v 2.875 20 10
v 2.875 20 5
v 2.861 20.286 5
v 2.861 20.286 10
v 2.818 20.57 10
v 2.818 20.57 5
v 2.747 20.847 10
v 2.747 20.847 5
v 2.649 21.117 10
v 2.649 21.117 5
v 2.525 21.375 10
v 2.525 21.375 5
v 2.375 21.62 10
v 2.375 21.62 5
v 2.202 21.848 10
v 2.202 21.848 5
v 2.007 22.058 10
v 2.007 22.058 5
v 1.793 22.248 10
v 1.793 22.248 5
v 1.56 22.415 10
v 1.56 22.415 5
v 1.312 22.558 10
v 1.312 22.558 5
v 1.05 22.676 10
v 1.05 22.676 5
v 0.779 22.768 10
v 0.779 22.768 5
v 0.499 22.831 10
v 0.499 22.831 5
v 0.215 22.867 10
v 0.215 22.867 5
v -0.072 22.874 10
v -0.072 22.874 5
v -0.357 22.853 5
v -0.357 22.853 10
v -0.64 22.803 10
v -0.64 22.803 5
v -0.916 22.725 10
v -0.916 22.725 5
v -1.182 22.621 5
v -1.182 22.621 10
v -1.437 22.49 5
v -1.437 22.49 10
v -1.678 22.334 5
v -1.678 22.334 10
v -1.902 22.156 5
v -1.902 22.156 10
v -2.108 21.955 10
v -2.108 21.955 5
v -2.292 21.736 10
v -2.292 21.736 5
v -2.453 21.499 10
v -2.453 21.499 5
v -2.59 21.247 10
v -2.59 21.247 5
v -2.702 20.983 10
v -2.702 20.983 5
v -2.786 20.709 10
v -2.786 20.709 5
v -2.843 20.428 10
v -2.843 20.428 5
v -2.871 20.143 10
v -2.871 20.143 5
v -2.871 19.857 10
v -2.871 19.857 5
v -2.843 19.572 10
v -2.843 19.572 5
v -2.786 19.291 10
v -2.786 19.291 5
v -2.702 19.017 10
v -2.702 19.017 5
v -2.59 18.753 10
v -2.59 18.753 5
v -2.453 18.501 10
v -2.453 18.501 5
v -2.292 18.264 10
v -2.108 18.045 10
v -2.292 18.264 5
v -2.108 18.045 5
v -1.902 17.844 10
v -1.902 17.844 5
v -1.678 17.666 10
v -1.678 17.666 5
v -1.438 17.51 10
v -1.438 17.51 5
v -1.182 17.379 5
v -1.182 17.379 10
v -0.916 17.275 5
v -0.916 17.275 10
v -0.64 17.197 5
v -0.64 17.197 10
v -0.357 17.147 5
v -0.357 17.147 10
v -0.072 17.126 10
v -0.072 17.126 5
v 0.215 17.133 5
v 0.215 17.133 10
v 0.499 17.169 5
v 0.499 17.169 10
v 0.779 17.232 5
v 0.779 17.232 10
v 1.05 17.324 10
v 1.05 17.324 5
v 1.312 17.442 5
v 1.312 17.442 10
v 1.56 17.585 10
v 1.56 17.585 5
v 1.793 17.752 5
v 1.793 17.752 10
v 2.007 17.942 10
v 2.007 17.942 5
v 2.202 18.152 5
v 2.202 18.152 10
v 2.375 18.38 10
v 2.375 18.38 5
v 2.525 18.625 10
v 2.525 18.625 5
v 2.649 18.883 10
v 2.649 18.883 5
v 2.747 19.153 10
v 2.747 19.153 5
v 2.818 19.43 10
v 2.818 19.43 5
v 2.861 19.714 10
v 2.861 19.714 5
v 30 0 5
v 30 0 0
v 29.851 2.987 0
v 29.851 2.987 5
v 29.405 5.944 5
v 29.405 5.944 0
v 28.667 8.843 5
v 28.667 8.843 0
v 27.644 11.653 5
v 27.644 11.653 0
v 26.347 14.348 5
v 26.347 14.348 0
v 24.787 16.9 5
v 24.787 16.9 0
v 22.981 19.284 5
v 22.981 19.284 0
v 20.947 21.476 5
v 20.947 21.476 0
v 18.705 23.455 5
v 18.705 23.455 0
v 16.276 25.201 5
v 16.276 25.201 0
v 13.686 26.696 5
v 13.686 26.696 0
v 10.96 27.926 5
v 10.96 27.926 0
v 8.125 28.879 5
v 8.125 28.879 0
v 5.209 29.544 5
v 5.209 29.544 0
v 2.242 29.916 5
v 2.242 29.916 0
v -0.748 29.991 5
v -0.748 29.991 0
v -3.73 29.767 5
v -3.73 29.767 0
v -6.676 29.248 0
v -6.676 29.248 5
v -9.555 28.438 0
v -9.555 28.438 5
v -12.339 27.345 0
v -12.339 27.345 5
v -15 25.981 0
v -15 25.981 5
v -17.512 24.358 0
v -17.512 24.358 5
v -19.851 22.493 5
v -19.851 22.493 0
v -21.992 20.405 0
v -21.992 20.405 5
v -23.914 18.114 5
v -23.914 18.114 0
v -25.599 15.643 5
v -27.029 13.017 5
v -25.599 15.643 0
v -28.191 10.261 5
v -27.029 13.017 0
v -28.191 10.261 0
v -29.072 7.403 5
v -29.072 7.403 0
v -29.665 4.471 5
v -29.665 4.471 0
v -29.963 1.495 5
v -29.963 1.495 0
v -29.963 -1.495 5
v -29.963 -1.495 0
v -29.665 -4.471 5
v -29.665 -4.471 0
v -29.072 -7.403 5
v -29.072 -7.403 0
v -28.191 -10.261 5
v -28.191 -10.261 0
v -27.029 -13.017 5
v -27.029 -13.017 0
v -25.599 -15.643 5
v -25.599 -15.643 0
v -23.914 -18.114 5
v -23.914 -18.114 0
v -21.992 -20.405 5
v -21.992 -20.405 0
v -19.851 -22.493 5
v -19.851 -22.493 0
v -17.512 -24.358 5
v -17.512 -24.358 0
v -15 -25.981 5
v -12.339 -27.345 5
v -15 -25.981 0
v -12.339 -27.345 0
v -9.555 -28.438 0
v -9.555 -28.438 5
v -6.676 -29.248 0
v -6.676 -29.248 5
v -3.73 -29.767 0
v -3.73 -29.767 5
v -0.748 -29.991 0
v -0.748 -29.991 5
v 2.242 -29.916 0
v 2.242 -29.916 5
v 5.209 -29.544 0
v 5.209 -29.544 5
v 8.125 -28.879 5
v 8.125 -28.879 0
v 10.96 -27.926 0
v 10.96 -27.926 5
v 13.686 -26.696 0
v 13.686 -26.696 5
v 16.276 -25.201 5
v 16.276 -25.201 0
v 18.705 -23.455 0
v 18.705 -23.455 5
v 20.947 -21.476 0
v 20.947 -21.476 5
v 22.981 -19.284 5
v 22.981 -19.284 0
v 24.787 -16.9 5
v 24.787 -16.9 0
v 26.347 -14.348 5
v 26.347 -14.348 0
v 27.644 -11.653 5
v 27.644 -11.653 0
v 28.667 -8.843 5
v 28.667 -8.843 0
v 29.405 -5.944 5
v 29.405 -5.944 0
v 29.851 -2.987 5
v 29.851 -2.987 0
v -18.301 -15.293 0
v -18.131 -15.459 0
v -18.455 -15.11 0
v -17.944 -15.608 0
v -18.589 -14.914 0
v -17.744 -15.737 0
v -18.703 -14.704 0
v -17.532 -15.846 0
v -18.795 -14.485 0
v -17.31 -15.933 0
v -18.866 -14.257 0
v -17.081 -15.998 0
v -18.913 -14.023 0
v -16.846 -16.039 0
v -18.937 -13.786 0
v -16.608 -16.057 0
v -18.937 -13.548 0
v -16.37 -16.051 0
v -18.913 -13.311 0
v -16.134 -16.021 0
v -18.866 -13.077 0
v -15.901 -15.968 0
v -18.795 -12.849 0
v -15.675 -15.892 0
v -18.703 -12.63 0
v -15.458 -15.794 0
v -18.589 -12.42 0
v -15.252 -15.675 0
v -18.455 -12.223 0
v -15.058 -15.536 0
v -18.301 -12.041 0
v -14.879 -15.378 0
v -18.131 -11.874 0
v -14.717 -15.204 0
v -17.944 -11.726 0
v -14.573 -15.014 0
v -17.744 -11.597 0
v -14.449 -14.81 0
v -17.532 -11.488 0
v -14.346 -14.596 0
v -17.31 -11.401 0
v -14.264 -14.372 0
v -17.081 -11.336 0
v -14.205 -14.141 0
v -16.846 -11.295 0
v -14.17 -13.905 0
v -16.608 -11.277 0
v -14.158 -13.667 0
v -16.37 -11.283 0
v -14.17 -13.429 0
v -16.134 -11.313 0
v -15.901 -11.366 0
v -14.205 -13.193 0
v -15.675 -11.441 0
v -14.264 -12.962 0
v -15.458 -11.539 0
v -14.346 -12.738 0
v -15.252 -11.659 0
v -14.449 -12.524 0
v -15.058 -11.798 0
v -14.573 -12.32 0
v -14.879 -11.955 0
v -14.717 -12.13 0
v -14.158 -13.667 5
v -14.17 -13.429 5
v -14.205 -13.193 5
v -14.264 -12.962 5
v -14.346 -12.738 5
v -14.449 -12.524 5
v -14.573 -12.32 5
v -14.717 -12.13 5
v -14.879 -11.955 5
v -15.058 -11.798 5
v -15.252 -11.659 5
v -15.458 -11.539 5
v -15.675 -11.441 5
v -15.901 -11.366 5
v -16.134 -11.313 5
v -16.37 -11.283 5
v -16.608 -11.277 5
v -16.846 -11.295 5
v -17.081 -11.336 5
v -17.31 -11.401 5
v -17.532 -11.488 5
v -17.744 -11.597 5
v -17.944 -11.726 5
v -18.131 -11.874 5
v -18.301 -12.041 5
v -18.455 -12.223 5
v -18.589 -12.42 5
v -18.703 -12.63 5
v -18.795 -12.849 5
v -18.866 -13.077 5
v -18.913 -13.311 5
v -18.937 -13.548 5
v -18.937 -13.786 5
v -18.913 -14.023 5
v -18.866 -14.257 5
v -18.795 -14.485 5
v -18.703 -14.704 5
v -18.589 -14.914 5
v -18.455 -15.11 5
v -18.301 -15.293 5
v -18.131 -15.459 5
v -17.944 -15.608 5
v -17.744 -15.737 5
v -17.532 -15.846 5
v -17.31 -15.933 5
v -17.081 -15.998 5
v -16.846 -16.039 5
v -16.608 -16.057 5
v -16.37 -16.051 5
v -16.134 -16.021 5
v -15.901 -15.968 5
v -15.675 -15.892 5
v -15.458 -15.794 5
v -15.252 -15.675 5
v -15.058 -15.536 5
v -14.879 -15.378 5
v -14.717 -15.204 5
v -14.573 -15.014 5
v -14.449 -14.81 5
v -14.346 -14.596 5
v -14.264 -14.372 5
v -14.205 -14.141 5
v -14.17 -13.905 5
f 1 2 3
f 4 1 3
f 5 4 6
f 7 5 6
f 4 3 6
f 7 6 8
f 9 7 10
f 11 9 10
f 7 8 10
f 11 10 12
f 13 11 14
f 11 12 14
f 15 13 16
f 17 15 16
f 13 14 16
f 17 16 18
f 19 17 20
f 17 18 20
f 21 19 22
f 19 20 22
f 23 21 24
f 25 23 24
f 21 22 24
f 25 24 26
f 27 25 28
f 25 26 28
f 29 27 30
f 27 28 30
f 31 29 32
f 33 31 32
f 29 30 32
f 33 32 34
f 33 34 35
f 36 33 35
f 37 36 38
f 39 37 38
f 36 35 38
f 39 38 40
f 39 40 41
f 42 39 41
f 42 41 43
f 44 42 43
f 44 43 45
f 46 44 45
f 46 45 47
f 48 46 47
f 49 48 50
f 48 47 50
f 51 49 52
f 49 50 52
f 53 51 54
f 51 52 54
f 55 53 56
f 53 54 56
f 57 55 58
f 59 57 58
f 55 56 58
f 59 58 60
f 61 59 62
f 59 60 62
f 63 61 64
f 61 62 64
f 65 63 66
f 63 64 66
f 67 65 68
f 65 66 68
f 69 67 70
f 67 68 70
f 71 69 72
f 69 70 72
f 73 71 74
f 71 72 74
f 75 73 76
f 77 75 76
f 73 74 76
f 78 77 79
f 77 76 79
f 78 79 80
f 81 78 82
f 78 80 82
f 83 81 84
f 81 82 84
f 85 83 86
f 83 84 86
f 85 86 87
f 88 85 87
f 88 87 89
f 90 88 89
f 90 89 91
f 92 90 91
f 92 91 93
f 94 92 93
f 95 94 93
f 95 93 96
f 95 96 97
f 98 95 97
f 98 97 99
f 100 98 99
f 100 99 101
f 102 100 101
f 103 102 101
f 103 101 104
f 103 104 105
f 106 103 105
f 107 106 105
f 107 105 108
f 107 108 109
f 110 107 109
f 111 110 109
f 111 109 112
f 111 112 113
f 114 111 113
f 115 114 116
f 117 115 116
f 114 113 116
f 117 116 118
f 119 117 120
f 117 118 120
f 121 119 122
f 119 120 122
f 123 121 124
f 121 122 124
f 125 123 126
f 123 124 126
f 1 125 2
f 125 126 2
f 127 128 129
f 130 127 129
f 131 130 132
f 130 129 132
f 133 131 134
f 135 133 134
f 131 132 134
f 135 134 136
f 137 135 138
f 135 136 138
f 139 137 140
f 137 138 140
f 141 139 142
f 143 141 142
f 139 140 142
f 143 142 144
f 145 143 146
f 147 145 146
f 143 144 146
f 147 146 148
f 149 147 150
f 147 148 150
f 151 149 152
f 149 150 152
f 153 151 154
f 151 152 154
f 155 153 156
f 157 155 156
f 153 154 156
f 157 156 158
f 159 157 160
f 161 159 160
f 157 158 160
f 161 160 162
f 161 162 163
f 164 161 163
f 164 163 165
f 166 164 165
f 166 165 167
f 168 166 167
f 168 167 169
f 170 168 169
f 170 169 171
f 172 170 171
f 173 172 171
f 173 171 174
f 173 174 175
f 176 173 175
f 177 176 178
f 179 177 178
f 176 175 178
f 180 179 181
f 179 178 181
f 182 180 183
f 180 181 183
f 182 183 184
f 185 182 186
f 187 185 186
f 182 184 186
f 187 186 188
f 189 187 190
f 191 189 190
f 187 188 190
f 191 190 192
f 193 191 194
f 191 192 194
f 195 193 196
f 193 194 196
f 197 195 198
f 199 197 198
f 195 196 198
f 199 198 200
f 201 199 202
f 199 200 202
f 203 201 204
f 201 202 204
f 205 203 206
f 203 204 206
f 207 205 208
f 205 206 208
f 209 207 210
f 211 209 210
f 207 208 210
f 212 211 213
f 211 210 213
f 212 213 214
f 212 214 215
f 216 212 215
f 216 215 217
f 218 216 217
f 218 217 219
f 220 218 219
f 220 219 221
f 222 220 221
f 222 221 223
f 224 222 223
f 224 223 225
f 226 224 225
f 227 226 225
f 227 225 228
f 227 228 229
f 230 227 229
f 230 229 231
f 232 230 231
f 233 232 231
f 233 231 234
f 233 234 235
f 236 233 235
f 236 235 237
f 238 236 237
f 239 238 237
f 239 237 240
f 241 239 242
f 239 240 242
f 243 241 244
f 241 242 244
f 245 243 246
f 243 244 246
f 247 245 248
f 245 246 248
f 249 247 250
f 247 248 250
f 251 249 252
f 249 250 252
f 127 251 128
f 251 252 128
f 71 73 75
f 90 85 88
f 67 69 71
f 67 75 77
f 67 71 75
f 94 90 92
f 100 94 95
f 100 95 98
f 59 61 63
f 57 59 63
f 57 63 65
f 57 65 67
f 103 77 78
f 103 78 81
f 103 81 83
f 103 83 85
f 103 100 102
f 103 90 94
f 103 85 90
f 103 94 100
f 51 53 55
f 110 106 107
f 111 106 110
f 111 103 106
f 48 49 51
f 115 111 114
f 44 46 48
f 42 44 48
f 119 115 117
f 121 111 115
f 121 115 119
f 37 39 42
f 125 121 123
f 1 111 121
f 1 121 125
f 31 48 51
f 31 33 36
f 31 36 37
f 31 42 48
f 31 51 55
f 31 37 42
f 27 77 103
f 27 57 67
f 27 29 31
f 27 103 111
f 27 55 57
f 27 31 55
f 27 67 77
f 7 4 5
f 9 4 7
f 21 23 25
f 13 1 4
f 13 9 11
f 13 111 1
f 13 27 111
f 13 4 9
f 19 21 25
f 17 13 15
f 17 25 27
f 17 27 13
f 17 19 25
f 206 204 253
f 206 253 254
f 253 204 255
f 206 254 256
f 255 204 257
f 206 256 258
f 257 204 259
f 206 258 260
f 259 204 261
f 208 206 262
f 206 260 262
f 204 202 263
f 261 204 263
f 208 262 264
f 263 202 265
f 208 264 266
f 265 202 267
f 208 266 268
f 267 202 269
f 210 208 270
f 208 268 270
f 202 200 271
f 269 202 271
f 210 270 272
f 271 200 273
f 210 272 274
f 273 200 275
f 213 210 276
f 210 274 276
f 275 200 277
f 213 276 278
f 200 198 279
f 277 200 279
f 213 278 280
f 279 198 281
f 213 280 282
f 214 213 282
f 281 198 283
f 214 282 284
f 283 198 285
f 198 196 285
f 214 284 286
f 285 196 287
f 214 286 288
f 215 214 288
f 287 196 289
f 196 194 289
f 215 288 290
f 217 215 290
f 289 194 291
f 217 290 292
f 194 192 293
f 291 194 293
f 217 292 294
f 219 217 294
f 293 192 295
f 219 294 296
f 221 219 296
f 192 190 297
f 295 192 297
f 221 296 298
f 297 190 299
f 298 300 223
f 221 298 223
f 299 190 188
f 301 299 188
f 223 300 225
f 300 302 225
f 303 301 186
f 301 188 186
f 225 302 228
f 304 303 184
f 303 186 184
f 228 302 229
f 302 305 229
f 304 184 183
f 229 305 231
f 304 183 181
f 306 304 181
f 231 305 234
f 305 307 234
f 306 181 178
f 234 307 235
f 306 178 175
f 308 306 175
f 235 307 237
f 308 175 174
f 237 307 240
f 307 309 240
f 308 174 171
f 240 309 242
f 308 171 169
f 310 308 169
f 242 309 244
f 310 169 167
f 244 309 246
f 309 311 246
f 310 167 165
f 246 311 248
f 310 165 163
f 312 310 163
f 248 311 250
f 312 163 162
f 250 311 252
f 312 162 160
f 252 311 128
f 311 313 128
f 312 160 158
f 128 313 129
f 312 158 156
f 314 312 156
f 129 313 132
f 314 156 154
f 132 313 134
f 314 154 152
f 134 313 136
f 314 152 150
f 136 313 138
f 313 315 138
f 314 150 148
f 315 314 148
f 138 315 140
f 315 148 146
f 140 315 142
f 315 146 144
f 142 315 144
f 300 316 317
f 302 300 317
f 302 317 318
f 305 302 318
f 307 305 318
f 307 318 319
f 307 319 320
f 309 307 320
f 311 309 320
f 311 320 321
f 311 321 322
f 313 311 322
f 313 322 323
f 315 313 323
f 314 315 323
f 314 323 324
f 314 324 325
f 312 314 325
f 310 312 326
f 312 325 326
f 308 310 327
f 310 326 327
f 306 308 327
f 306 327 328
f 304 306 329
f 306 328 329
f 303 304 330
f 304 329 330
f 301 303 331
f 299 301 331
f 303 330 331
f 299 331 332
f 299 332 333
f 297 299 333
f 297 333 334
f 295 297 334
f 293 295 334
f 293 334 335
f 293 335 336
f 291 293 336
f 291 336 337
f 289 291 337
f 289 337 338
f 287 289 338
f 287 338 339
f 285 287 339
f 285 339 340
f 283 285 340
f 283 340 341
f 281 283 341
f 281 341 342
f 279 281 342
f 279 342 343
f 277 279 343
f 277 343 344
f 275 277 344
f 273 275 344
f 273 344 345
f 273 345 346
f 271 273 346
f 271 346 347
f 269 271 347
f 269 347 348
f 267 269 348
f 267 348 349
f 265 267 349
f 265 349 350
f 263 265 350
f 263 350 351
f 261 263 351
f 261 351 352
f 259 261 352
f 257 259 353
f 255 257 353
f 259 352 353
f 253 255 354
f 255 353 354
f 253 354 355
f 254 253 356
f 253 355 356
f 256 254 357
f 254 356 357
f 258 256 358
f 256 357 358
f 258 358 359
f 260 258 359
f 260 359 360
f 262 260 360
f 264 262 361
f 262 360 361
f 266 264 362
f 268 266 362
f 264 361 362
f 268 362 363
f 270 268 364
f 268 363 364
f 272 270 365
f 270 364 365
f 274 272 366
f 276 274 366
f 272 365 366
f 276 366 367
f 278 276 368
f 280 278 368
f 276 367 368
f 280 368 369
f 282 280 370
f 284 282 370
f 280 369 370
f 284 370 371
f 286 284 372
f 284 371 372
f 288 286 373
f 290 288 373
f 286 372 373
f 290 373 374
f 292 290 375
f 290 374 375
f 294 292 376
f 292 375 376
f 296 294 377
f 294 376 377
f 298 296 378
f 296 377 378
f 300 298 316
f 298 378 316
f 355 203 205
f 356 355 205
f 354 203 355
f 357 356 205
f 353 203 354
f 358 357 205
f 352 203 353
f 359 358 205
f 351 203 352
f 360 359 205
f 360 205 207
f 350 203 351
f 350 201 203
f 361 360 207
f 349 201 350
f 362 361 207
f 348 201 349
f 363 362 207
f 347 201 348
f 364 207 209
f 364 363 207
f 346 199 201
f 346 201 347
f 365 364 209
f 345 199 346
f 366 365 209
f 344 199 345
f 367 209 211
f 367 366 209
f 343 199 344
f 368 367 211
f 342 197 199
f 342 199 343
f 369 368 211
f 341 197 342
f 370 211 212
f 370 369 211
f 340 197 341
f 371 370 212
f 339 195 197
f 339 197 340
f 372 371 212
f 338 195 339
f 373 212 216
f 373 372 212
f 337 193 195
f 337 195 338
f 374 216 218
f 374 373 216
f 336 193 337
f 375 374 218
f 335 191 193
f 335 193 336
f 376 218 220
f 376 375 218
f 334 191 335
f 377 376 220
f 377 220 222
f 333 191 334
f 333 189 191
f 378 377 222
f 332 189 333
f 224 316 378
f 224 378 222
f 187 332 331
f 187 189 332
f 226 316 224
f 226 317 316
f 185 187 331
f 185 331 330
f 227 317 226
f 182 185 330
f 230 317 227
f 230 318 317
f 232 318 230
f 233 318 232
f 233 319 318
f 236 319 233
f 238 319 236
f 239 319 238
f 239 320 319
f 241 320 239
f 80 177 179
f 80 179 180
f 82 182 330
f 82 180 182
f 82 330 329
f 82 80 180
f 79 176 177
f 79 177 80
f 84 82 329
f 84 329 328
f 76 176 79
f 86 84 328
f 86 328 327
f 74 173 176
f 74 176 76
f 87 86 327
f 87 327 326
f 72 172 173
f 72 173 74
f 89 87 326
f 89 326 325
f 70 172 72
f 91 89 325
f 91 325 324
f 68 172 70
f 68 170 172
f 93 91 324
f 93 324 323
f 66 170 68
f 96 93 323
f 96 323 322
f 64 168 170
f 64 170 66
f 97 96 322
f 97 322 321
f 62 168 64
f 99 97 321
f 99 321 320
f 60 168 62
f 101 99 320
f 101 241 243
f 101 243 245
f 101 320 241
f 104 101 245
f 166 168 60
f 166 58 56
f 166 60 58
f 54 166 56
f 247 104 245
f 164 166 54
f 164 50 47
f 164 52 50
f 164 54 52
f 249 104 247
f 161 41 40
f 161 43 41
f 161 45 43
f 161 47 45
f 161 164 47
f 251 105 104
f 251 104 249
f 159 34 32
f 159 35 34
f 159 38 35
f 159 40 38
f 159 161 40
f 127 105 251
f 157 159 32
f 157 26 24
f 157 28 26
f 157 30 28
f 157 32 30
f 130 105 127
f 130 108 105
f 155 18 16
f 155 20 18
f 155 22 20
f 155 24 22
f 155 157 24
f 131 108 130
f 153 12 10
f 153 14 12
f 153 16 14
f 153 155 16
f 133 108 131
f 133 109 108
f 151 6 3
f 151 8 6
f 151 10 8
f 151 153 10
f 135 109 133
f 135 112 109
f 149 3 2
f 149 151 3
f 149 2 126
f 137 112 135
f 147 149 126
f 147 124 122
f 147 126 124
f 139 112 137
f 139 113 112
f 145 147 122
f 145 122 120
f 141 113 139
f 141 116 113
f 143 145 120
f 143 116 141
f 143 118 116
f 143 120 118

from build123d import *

# Parameters (mm, degrees)
SKETCH1_R           = 30
BOSS_EXTRUDE1_DEPTH = 5
SKETCH2_R           = 2.875
BOSS_EXTRUDE2_DEPTH = 5
SKETCH3_R           = 2.390739662
CUT_EXTRUDE1_DEPTH  = 10


with BuildPart() as part:
    # Sketch1 → Boss-Extrude1 (new body)
    with BuildSketch(Plane.XY):
        Circle(SKETCH1_R)
    extrude(amount=BOSS_EXTRUDE1_DEPTH)

    # Sketch2 → Boss-Extrude2 (add)
    with BuildSketch(Plane.XY.offset(5)):
        with Locations((0, 20)):
            Circle(SKETCH2_R)
    extrude(amount=BOSS_EXTRUDE2_DEPTH)

    # Sketch3 → Cut-Extrude1 (cut)
    with BuildSketch(Plane.XY.offset(5)):
        with Locations((-16.548801548, -13.666947255)):
            Circle(SKETCH3_R)
    extrude(amount=-CUT_EXTRUDE1_DEPTH, mode=Mode.SUBTRACT)


solid = part.part
